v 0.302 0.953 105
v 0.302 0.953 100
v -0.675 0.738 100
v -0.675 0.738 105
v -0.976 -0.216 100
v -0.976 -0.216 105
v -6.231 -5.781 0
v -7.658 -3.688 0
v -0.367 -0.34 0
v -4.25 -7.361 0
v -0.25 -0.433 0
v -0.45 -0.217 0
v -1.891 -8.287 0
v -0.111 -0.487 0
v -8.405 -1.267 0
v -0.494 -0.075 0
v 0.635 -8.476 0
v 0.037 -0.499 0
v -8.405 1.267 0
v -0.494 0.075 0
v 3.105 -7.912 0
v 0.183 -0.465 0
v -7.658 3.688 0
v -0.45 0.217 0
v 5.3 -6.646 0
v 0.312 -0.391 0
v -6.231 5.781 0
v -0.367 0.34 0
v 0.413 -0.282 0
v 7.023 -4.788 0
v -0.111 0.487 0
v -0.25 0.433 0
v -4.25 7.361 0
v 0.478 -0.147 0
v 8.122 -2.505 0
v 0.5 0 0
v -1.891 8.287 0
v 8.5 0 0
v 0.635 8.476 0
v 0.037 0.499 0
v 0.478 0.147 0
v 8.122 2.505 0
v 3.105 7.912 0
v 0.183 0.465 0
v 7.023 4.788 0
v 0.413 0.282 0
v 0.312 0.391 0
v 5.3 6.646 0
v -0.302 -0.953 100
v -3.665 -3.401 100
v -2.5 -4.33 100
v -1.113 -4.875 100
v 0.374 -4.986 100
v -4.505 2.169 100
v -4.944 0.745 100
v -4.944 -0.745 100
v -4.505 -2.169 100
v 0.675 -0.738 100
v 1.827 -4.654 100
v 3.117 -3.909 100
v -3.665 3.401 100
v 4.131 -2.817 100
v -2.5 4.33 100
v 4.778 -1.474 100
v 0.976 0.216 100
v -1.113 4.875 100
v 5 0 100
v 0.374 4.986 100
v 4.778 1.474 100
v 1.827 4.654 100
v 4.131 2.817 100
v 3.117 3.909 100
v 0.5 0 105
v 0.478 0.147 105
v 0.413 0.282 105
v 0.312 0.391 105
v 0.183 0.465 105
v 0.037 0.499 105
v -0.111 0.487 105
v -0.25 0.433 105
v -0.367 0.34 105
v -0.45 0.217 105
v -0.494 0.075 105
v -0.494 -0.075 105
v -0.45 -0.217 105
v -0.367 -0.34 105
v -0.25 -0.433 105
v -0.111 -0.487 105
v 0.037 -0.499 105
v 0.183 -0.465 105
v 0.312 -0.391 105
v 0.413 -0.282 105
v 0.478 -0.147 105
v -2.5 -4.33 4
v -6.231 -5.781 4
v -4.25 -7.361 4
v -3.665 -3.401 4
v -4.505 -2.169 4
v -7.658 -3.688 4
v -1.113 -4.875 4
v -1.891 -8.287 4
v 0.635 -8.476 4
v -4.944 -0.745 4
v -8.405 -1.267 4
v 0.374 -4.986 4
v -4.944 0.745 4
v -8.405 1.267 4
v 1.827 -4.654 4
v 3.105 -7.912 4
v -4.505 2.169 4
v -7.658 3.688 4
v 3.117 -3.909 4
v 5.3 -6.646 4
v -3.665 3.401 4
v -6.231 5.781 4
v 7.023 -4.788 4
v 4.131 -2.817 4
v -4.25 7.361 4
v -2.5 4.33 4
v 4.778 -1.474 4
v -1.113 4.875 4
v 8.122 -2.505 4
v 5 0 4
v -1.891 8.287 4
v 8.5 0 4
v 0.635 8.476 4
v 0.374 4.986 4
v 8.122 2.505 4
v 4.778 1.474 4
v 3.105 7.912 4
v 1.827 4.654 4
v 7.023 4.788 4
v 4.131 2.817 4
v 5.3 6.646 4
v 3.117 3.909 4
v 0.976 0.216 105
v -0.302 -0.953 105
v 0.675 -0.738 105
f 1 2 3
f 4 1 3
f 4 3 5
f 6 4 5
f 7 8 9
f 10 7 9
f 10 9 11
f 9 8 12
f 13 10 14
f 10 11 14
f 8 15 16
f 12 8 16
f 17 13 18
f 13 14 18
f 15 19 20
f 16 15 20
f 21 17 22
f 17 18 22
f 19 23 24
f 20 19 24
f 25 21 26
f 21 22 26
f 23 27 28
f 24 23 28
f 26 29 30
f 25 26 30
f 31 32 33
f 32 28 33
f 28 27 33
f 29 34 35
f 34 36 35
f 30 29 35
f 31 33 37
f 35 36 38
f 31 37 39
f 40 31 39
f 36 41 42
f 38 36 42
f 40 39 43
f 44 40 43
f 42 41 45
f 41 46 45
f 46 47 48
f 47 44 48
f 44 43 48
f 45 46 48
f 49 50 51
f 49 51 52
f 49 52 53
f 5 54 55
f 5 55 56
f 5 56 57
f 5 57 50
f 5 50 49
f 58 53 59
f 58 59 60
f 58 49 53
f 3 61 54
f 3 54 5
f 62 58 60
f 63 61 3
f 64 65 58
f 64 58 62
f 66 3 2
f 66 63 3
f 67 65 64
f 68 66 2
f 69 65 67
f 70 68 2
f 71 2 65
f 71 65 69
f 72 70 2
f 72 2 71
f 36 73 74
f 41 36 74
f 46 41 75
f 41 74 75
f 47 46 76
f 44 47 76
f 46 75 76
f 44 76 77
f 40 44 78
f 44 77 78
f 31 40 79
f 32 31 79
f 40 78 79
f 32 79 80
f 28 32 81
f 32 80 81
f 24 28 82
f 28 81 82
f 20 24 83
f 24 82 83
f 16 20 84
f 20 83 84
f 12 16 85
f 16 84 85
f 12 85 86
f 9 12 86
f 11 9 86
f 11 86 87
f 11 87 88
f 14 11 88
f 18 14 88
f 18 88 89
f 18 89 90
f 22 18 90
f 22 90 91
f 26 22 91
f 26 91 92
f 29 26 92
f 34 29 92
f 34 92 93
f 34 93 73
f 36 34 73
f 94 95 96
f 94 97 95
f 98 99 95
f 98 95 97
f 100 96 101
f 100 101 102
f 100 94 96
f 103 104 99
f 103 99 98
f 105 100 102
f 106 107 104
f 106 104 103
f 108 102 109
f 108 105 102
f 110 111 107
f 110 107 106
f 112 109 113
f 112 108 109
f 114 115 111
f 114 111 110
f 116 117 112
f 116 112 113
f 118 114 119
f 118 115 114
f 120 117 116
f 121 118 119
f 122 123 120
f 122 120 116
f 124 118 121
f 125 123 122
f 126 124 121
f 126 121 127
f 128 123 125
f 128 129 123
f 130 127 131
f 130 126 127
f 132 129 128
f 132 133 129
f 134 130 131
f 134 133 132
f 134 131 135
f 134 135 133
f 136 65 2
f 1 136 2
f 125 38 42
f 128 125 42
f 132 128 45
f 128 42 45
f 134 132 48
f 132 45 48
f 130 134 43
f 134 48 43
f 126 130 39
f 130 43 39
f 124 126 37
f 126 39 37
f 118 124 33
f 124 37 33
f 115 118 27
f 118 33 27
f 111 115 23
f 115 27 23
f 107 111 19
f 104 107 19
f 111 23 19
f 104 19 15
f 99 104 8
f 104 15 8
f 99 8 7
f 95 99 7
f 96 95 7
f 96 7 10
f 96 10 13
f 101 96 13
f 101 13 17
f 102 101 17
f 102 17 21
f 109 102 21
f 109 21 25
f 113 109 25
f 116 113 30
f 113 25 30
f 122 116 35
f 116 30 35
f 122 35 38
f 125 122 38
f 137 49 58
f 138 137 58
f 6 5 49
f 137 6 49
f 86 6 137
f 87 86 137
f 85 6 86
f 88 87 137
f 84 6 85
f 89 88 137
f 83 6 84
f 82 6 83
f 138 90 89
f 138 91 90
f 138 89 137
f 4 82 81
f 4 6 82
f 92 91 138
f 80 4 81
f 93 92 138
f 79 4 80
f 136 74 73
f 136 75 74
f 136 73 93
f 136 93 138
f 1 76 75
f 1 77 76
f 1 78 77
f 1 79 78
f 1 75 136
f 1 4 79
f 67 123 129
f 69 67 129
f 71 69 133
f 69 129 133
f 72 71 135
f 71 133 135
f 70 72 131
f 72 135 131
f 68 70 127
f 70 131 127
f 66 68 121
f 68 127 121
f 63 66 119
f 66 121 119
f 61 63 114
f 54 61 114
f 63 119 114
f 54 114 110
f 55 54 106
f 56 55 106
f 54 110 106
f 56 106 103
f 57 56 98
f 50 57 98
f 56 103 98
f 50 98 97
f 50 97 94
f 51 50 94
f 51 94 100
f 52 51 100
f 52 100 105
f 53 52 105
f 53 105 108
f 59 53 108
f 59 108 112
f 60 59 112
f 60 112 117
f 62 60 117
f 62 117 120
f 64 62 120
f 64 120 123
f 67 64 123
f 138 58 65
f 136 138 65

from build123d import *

# Parameters (mm, degrees)
F0_R     = 8.5
F1_DEPTH = 4
F2_R     = 5
F3_DEPTH = 100
F5_DEPTH = 5
F6_R     = 0.5
F7_DEPTH = 115.3


with BuildPart() as f1:
    # F0 (on Top) → F1 (new body)
    with BuildSketch(Plane.XY):
        Circle(F0_R)
    extrude(amount=F1_DEPTH)

    # F2 (on Top) → F3 (join)
    with BuildSketch(Plane.XY):
        Circle(F2_R)
    extrude(amount=F3_DEPTH)

    # F4 (on face) → F5 (join)
    with BuildSketch(Plane.XY.offset(100)):
        Polygon((0.674898, -0.737911), (0.976499, 0.215523), (0.301601, 0.953434), (-0.674898, 0.737911), (-0.976499, -0.215523), (-0.301601, -0.953434), align=None)
    extrude(amount=F5_DEPTH)

    # F6 (on face) → F7 (cut)
    with BuildSketch(Plane.XY.offset(105)):
        Circle(F6_R)
    extrude(amount=-F7_DEPTH, mode=Mode.SUBTRACT)


solid = f1.part
